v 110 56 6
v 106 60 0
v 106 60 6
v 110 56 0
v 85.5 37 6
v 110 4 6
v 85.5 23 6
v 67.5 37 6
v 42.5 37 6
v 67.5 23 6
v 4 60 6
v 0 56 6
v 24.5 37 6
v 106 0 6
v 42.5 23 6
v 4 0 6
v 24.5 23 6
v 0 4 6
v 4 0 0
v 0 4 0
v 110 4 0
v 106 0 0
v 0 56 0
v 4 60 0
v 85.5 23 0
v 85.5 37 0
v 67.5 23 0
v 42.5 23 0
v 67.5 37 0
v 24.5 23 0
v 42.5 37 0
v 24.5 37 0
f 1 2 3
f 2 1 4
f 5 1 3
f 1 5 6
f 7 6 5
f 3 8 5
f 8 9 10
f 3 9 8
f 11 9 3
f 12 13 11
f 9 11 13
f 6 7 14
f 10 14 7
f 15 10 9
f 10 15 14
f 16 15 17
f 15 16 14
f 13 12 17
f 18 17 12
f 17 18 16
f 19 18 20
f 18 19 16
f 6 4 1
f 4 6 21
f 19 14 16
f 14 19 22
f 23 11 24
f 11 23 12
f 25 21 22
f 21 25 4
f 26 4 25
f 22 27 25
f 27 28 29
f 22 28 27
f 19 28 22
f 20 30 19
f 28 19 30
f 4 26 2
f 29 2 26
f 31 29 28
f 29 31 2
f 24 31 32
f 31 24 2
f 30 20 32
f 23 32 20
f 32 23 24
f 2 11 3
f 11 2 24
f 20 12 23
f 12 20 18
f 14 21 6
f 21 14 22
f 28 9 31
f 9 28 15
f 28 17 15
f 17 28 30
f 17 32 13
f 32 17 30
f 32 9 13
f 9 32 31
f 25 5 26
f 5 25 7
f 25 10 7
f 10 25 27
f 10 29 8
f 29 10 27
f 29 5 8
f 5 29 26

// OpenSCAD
$fn = 32;

// ----------------------------------------------------------------------
// Windowed plate: 2 voids, 110 x 60 x 6 mm
// ----------------------------------------------------------------------

// --- parameters (mm) ---
plate_l = 110;            // plate length, X
plate_w = 60;             // plate width, Y
plate_t = 6;              // plate thickness, Z
edge_margin = 12;         // wall from the plate edge to any window
windows = 2;              // number of windows in the row
win_l = 18;               // window length
win_w = 14;               // window width
win_pitch = 43;           // window pitch along X
depth_1 = 6;              // depth of void 1 (full thickness = through)
depth_2 = 6;              // depth of void 2 (full thickness = through)
corner_c = 4;             // corner chamfer of the plate

profile = [[4, 0], [106, 0], [110, 4], [110, 56], [106, 60], [4, 60], [0, 56], [0, 4]];  // primary outline, 8 points, counter clockwise
void_1 = [[24.5, 23], [42.5, 23], [42.5, 37], [24.5, 37]];  // window 1 of the row, 4 points
void_2 = [[67.5, 23], [85.5, 23], [85.5, 37], [67.5, 37]];  // window 2 of the row, 4 points

// --- the one profile operation ---
difference() {
  linear_extrude(height = plate_t) polygon(points = profile);
  translate([0, 0, -1])
    linear_extrude(height = plate_t + 2) polygon(points = void_1);
  translate([0, 0, -1])
    linear_extrude(height = plate_t + 2) polygon(points = void_2);
}
